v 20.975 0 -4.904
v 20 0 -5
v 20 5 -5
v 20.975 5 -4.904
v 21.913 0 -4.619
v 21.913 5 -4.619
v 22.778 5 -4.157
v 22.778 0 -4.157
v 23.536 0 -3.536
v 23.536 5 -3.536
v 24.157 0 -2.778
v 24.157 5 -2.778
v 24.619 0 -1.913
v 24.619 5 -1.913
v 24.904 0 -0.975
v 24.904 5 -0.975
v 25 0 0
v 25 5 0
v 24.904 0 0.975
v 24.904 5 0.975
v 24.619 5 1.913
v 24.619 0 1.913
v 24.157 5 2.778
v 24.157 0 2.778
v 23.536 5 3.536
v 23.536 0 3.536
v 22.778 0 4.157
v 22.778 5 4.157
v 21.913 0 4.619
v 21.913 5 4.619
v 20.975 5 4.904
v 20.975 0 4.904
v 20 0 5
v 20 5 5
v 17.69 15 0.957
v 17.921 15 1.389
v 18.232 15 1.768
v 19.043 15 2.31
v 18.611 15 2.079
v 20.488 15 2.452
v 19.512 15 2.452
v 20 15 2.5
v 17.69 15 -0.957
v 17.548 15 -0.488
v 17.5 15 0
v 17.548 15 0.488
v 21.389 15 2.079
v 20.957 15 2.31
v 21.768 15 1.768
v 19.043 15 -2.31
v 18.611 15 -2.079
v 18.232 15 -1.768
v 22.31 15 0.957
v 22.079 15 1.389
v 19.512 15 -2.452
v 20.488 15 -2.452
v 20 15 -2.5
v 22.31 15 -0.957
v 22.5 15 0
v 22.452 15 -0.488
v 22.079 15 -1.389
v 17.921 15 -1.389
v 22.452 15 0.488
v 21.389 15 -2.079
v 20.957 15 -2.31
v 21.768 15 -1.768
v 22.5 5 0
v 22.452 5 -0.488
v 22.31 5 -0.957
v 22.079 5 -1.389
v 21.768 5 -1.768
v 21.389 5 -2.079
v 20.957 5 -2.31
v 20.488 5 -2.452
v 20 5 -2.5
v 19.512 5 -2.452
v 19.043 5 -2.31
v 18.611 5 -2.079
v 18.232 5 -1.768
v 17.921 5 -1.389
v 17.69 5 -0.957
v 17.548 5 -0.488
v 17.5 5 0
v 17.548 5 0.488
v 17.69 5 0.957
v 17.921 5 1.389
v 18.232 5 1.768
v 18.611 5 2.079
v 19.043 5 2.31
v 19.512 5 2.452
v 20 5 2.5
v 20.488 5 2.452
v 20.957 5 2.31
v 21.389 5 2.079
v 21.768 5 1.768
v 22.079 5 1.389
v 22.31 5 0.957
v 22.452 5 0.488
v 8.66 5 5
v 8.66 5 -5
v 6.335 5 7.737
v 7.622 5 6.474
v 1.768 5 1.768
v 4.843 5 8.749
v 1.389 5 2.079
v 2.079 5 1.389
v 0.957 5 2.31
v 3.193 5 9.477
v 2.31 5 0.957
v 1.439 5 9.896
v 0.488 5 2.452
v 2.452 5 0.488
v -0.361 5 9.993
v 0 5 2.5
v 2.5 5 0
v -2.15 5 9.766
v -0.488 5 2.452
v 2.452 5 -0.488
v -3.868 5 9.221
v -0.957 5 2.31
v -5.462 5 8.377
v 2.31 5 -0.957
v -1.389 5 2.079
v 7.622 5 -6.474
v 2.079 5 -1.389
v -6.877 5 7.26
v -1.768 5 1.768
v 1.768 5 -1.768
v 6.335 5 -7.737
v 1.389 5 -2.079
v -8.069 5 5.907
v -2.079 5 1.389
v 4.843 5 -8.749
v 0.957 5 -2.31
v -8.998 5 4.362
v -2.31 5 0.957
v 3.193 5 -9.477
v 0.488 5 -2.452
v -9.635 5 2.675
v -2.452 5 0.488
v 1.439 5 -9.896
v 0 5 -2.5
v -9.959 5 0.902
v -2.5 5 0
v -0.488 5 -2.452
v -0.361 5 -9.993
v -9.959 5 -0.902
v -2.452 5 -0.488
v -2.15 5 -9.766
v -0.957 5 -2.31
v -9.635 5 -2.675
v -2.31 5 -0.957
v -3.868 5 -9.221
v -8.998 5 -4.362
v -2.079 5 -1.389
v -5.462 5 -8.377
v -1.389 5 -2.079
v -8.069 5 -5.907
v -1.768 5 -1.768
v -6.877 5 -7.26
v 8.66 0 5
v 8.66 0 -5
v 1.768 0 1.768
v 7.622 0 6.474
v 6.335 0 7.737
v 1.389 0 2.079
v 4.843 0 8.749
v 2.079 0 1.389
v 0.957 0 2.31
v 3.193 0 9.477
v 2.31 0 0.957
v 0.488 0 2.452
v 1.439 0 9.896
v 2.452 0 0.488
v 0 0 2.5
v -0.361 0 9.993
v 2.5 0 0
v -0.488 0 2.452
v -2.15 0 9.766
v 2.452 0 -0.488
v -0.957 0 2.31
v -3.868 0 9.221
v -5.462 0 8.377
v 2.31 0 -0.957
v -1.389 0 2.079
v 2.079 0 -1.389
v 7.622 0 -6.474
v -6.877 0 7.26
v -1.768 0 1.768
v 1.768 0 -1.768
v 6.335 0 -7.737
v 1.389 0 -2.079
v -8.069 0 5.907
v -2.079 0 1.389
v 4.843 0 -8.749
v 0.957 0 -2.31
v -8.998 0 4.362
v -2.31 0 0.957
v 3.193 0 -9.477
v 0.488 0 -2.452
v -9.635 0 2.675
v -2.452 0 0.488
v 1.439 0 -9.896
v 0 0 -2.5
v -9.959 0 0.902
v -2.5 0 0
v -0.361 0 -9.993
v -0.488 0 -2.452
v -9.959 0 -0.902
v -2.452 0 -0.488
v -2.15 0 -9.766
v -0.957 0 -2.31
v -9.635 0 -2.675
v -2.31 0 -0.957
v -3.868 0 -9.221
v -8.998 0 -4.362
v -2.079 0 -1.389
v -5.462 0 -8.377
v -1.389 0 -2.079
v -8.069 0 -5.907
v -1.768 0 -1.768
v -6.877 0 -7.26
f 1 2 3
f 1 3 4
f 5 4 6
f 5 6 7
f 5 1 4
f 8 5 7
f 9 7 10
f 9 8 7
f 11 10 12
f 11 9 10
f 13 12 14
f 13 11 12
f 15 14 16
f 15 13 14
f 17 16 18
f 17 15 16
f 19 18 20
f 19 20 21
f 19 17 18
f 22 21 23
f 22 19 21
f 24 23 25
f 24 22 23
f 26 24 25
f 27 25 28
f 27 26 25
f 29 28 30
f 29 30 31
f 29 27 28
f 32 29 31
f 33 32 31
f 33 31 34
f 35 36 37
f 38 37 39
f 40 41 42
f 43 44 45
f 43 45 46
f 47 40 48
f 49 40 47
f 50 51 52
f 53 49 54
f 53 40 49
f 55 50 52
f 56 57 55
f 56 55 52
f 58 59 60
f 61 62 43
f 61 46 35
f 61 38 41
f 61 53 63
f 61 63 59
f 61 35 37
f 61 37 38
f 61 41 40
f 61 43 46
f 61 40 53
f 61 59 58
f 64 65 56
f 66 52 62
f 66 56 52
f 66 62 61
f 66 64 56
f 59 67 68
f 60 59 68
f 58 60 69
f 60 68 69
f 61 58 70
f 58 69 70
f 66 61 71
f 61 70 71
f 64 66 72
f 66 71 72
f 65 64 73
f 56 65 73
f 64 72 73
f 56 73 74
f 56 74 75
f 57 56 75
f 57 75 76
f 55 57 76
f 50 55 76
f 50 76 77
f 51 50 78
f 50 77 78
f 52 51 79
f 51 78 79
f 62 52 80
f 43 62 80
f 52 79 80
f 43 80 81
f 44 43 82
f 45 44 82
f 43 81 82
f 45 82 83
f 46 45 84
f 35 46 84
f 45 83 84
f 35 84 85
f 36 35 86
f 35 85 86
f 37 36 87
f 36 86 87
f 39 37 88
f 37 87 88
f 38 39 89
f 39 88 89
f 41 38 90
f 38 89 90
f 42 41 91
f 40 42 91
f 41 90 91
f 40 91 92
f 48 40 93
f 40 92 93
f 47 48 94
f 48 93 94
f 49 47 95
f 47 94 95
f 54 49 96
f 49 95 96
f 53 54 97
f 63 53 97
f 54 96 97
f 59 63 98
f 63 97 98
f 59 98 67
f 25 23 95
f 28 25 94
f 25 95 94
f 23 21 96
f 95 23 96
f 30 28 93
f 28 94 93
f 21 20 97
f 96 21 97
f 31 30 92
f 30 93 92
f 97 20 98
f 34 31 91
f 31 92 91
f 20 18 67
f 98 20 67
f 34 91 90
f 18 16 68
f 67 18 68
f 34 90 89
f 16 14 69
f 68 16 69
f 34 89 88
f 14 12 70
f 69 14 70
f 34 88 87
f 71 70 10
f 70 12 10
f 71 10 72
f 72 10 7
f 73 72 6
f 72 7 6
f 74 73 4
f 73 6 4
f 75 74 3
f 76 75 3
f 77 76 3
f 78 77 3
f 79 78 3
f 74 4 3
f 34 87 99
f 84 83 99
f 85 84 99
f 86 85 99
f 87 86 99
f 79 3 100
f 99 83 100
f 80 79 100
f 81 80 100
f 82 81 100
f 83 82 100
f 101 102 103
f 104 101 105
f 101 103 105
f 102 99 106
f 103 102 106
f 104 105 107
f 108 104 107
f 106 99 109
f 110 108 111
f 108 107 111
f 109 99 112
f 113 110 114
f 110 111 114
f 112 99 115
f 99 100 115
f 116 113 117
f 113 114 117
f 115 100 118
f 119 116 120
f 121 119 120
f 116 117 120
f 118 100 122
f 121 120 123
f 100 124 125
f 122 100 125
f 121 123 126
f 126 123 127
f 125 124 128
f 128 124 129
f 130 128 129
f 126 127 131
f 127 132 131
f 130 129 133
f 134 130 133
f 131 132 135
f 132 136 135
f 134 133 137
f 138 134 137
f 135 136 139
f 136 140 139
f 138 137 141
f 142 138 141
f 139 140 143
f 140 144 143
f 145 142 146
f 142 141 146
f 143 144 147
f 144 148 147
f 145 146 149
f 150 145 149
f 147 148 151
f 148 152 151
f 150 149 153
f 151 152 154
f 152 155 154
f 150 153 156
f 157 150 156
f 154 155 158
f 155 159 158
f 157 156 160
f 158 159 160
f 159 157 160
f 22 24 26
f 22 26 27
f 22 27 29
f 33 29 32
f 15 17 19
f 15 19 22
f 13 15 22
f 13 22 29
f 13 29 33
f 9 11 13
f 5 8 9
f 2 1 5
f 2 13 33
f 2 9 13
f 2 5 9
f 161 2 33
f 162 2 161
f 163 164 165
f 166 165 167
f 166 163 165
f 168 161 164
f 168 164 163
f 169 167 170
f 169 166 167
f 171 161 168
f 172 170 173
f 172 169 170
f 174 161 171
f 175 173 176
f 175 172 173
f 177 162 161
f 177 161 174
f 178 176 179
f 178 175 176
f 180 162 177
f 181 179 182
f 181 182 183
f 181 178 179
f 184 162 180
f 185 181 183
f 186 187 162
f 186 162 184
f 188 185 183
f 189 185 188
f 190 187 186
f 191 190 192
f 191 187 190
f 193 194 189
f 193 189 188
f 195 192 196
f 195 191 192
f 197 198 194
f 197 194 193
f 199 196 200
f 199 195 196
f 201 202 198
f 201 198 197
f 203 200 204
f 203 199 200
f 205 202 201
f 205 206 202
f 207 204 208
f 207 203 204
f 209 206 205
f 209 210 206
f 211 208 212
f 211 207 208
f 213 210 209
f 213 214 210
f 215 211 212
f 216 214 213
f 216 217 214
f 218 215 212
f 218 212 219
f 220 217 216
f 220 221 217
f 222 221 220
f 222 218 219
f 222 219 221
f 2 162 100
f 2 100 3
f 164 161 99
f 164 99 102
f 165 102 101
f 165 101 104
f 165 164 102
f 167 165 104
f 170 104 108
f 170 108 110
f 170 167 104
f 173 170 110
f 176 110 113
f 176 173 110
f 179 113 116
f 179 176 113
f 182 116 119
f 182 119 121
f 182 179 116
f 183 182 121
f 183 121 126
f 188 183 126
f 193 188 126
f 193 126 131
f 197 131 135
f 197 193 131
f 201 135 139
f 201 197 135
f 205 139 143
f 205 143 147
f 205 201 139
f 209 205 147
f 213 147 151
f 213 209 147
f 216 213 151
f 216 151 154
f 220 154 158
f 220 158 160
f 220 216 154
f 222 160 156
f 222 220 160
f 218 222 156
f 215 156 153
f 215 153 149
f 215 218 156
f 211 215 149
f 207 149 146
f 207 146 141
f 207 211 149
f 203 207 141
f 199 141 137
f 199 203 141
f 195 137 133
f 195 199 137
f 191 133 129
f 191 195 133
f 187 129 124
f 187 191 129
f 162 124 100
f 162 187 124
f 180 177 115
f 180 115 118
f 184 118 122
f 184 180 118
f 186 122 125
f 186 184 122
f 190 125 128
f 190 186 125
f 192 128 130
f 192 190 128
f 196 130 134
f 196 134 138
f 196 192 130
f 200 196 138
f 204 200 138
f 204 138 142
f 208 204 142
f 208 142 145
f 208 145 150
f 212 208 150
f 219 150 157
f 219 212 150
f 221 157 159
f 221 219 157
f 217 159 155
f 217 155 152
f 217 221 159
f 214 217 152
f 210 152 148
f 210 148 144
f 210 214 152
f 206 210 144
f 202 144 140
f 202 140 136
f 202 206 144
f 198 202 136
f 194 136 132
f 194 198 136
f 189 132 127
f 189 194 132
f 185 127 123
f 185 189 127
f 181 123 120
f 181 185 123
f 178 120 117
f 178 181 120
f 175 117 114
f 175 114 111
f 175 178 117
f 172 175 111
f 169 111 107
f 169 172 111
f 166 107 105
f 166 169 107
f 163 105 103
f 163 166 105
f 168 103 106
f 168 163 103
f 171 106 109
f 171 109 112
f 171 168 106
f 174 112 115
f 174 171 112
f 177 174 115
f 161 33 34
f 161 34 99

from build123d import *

# Parameters (mm, degrees)
SKETCH1_R           = 2.5
BOSS_EXTRUDE1_DEPTH = 5
SKETCH2_R           = 2.5
BOSS_EXTRUDE2_DEPTH = 10


with BuildPart() as part:
    # Sketch1 → Boss-Extrude1 (new body)
    with BuildSketch(Plane(origin=(0, 0, 0), x_dir=(1, 0, 0), z_dir=(0, 1, 0))):
        with BuildLine():
            Line((8.660254038, 5), (20, 5))
            ThreePointArc((20, 5), (25, 0), (20, -5))
            Line((20, -5), (8.660254038, -5))
            ThreePointArc((8.660254038, -5), (-10, 0), (8.660254038, 5))
        make_face()
        Circle(SKETCH1_R, mode=Mode.SUBTRACT)
    extrude(amount=BOSS_EXTRUDE1_DEPTH)

    # Sketch2 → Boss-Extrude2 (add)
    with BuildSketch(Plane(origin=(0, 5, 0), x_dir=(1, 0, 0), z_dir=(0, 1, 0))):
        with Locations((20, 0)):
            Circle(SKETCH2_R)
    extrude(amount=BOSS_EXTRUDE2_DEPTH)


solid = part.part
